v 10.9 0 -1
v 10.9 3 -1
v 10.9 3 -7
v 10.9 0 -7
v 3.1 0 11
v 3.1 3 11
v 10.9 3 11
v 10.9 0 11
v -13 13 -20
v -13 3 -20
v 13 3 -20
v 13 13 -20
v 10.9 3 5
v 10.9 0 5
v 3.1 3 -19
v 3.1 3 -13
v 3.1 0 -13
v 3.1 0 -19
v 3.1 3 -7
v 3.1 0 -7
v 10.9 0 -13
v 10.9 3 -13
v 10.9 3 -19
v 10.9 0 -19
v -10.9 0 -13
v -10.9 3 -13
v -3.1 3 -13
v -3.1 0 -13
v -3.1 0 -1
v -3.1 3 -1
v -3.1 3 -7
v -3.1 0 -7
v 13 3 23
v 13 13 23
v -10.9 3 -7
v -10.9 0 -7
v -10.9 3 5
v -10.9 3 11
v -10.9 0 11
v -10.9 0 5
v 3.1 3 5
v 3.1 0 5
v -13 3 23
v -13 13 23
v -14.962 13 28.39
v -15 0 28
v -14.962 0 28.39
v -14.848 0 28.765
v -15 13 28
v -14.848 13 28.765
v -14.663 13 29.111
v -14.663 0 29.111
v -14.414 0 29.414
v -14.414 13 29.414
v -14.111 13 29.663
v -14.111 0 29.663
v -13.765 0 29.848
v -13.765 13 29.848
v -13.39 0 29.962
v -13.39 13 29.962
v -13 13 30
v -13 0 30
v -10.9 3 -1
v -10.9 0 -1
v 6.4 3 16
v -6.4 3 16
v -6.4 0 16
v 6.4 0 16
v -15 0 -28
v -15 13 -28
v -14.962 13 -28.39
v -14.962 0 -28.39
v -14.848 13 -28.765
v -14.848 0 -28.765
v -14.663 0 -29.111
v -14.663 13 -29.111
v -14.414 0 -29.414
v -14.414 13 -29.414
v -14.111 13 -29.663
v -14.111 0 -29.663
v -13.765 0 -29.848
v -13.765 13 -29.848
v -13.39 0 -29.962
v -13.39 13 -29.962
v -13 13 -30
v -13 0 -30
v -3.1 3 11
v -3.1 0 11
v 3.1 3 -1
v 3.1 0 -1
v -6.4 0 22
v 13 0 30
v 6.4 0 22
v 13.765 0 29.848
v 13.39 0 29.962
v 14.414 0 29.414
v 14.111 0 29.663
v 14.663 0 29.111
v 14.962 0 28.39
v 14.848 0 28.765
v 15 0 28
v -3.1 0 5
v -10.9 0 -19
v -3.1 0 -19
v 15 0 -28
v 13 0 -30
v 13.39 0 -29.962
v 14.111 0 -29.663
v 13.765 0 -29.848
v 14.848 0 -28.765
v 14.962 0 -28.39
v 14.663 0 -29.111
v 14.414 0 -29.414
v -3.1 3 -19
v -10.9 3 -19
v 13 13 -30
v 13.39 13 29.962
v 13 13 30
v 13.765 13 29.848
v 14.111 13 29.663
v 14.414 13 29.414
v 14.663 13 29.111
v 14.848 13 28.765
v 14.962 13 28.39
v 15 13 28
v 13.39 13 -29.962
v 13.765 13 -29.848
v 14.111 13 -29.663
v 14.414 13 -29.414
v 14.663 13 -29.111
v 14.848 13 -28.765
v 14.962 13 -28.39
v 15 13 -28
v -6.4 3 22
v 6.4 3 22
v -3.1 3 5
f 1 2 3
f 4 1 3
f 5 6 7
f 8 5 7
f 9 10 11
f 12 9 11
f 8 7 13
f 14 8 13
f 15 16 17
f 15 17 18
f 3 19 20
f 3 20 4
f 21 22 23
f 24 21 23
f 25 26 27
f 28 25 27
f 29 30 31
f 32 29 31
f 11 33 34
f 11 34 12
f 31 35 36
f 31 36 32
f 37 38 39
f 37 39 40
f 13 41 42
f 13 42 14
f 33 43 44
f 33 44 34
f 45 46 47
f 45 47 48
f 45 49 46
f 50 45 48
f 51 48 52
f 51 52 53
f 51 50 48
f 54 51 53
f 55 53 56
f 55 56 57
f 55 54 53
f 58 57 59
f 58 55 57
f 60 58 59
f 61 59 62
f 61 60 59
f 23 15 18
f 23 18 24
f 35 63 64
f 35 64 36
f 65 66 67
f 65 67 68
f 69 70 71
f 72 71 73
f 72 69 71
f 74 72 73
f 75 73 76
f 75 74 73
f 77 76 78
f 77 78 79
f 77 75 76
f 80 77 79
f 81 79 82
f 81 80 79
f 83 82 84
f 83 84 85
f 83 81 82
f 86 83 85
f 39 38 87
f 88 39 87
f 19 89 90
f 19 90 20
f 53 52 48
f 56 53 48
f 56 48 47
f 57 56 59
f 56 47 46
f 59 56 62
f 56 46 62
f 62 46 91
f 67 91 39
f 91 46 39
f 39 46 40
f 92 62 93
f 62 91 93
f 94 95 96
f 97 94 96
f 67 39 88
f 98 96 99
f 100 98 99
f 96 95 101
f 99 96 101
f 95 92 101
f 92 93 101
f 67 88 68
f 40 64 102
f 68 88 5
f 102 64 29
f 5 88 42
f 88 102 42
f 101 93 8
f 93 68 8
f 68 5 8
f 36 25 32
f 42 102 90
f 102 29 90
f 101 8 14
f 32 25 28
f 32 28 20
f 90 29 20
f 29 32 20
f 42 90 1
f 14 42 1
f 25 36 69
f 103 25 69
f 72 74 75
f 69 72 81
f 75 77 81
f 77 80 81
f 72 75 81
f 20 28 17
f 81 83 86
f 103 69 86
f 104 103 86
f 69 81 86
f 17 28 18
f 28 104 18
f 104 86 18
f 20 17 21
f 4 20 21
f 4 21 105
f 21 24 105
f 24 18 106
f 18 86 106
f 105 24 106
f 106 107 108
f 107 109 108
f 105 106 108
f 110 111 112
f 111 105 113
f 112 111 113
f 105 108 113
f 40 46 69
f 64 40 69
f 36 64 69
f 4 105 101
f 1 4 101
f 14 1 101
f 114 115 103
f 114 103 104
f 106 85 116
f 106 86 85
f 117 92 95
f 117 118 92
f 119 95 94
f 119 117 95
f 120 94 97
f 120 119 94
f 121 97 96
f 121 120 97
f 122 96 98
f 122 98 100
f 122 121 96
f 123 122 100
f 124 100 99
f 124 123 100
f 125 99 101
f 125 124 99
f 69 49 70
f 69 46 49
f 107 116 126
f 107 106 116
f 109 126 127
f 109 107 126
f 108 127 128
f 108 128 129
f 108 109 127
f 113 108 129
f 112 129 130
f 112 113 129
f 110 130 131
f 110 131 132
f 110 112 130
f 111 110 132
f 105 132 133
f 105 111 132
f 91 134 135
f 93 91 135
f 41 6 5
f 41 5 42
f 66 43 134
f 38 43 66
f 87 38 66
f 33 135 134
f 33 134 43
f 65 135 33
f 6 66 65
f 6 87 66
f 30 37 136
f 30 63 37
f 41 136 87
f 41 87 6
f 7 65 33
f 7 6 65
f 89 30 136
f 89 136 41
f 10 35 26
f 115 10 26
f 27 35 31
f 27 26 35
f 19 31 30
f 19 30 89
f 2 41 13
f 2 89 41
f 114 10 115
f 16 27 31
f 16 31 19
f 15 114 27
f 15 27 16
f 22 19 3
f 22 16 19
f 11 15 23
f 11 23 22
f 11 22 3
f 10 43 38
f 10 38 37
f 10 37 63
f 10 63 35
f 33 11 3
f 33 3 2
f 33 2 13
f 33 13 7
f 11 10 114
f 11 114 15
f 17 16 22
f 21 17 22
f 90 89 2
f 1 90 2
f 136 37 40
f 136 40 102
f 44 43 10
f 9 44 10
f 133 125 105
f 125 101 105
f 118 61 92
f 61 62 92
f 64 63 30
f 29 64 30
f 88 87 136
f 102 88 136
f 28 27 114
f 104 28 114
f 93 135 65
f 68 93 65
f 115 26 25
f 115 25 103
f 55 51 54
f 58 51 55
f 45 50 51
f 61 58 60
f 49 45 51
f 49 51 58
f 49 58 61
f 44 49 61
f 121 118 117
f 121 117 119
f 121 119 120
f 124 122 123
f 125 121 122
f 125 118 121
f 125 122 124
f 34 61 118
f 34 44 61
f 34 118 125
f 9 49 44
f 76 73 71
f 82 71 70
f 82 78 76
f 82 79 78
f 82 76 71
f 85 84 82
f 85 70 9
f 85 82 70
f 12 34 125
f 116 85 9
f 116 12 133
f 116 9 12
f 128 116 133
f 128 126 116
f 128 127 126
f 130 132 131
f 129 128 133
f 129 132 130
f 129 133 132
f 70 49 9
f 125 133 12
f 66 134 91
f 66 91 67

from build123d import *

# Parameters (mm, degrees)
SKETCH1_W           = 30
SKETCH1_H           = 60
BOSS_EXTRUDE1_DEPTH = 3
SKETCH2_W           = 12.8
SKETCH2_H           = 6
SKETCH2_W_2         = 7.8
CUT_EXTRUDE1_DEPTH  = 3
SKETCH4_W           = 30
SKETCH4_H           = 60
SKETCH4_W_2         = 26
SKETCH4_H_2         = 56
BOSS_EXTRUDE2_DEPTH = 10
SKETCH5_W           = 26
SKETCH5_H           = 8
SKETCH5_H_2         = 5
BOSS_EXTRUDE3_DEPTH = 10
FILLET1_R           = 2


with BuildPart() as part:
    # Sketch1 → Boss-Extrude1 (new body)
    with BuildSketch(Plane(origin=(0, 0, 0), x_dir=(1, 0, 0), z_dir=(0, 1, 0))):
        Rectangle(SKETCH1_W, SKETCH1_H)
    extrude(amount=BOSS_EXTRUDE1_DEPTH)

    # Sketch2 → Cut-Extrude1 (cut)
    with BuildSketch(Plane(origin=(0, 3, 0), x_dir=(1, 0, 0), z_dir=(0, 1, 0))):
        with Locations((0, -19)):
            Rectangle(SKETCH2_W, SKETCH2_H)
        with Locations((-7, 4)):
            Rectangle(SKETCH2_W_2, SKETCH2_H)
        with Locations((-7, -8)):
            Rectangle(SKETCH2_W_2, SKETCH2_H)
        with Locations((-7, 16)):
            Rectangle(SKETCH2_W_2, SKETCH2_H)
        with Locations((7, -8)):
            Rectangle(SKETCH2_W_2, SKETCH2_H)
        with Locations((7, 4)):
            Rectangle(SKETCH2_W_2, SKETCH2_H)
        with Locations((7, 16)):
            Rectangle(SKETCH2_W_2, SKETCH2_H)
    extrude(amount=-CUT_EXTRUDE1_DEPTH, mode=Mode.SUBTRACT)

    # Sketch4 → Boss-Extrude2 (add)
    with BuildSketch(Plane(origin=(0, 3, 0), x_dir=(1, 0, 0), z_dir=(0, 1, 0))):
        Rectangle(SKETCH4_W, SKETCH4_H)
        Rectangle(SKETCH4_W_2, SKETCH4_H_2, mode=Mode.SUBTRACT)
    extrude(amount=BOSS_EXTRUDE2_DEPTH)

    # Sketch5 → Boss-Extrude3 (add)
    with BuildSketch(Plane(origin=(0, 3, 0), x_dir=(1, 0, 0), z_dir=(0, 1, 0))):
        with Locations((0, 24)):
            Rectangle(SKETCH5_W, SKETCH5_H)
        with Locations((0, -25.5)):
            Rectangle(SKETCH5_W, SKETCH5_H_2)
    extrude(amount=BOSS_EXTRUDE3_DEPTH)

    # Fillet1
    fillet1_edges = [part.edges().sort_by_distance(p)[0] for p in [
        (15, 6.5, 30),
        (-15, 6.5, 30),
        (-15, 6.5, -30),
        (15, 6.5, -30),
    ]]
    fillet(fillet1_edges, radius=FILLET1_R)


solid = part.part
